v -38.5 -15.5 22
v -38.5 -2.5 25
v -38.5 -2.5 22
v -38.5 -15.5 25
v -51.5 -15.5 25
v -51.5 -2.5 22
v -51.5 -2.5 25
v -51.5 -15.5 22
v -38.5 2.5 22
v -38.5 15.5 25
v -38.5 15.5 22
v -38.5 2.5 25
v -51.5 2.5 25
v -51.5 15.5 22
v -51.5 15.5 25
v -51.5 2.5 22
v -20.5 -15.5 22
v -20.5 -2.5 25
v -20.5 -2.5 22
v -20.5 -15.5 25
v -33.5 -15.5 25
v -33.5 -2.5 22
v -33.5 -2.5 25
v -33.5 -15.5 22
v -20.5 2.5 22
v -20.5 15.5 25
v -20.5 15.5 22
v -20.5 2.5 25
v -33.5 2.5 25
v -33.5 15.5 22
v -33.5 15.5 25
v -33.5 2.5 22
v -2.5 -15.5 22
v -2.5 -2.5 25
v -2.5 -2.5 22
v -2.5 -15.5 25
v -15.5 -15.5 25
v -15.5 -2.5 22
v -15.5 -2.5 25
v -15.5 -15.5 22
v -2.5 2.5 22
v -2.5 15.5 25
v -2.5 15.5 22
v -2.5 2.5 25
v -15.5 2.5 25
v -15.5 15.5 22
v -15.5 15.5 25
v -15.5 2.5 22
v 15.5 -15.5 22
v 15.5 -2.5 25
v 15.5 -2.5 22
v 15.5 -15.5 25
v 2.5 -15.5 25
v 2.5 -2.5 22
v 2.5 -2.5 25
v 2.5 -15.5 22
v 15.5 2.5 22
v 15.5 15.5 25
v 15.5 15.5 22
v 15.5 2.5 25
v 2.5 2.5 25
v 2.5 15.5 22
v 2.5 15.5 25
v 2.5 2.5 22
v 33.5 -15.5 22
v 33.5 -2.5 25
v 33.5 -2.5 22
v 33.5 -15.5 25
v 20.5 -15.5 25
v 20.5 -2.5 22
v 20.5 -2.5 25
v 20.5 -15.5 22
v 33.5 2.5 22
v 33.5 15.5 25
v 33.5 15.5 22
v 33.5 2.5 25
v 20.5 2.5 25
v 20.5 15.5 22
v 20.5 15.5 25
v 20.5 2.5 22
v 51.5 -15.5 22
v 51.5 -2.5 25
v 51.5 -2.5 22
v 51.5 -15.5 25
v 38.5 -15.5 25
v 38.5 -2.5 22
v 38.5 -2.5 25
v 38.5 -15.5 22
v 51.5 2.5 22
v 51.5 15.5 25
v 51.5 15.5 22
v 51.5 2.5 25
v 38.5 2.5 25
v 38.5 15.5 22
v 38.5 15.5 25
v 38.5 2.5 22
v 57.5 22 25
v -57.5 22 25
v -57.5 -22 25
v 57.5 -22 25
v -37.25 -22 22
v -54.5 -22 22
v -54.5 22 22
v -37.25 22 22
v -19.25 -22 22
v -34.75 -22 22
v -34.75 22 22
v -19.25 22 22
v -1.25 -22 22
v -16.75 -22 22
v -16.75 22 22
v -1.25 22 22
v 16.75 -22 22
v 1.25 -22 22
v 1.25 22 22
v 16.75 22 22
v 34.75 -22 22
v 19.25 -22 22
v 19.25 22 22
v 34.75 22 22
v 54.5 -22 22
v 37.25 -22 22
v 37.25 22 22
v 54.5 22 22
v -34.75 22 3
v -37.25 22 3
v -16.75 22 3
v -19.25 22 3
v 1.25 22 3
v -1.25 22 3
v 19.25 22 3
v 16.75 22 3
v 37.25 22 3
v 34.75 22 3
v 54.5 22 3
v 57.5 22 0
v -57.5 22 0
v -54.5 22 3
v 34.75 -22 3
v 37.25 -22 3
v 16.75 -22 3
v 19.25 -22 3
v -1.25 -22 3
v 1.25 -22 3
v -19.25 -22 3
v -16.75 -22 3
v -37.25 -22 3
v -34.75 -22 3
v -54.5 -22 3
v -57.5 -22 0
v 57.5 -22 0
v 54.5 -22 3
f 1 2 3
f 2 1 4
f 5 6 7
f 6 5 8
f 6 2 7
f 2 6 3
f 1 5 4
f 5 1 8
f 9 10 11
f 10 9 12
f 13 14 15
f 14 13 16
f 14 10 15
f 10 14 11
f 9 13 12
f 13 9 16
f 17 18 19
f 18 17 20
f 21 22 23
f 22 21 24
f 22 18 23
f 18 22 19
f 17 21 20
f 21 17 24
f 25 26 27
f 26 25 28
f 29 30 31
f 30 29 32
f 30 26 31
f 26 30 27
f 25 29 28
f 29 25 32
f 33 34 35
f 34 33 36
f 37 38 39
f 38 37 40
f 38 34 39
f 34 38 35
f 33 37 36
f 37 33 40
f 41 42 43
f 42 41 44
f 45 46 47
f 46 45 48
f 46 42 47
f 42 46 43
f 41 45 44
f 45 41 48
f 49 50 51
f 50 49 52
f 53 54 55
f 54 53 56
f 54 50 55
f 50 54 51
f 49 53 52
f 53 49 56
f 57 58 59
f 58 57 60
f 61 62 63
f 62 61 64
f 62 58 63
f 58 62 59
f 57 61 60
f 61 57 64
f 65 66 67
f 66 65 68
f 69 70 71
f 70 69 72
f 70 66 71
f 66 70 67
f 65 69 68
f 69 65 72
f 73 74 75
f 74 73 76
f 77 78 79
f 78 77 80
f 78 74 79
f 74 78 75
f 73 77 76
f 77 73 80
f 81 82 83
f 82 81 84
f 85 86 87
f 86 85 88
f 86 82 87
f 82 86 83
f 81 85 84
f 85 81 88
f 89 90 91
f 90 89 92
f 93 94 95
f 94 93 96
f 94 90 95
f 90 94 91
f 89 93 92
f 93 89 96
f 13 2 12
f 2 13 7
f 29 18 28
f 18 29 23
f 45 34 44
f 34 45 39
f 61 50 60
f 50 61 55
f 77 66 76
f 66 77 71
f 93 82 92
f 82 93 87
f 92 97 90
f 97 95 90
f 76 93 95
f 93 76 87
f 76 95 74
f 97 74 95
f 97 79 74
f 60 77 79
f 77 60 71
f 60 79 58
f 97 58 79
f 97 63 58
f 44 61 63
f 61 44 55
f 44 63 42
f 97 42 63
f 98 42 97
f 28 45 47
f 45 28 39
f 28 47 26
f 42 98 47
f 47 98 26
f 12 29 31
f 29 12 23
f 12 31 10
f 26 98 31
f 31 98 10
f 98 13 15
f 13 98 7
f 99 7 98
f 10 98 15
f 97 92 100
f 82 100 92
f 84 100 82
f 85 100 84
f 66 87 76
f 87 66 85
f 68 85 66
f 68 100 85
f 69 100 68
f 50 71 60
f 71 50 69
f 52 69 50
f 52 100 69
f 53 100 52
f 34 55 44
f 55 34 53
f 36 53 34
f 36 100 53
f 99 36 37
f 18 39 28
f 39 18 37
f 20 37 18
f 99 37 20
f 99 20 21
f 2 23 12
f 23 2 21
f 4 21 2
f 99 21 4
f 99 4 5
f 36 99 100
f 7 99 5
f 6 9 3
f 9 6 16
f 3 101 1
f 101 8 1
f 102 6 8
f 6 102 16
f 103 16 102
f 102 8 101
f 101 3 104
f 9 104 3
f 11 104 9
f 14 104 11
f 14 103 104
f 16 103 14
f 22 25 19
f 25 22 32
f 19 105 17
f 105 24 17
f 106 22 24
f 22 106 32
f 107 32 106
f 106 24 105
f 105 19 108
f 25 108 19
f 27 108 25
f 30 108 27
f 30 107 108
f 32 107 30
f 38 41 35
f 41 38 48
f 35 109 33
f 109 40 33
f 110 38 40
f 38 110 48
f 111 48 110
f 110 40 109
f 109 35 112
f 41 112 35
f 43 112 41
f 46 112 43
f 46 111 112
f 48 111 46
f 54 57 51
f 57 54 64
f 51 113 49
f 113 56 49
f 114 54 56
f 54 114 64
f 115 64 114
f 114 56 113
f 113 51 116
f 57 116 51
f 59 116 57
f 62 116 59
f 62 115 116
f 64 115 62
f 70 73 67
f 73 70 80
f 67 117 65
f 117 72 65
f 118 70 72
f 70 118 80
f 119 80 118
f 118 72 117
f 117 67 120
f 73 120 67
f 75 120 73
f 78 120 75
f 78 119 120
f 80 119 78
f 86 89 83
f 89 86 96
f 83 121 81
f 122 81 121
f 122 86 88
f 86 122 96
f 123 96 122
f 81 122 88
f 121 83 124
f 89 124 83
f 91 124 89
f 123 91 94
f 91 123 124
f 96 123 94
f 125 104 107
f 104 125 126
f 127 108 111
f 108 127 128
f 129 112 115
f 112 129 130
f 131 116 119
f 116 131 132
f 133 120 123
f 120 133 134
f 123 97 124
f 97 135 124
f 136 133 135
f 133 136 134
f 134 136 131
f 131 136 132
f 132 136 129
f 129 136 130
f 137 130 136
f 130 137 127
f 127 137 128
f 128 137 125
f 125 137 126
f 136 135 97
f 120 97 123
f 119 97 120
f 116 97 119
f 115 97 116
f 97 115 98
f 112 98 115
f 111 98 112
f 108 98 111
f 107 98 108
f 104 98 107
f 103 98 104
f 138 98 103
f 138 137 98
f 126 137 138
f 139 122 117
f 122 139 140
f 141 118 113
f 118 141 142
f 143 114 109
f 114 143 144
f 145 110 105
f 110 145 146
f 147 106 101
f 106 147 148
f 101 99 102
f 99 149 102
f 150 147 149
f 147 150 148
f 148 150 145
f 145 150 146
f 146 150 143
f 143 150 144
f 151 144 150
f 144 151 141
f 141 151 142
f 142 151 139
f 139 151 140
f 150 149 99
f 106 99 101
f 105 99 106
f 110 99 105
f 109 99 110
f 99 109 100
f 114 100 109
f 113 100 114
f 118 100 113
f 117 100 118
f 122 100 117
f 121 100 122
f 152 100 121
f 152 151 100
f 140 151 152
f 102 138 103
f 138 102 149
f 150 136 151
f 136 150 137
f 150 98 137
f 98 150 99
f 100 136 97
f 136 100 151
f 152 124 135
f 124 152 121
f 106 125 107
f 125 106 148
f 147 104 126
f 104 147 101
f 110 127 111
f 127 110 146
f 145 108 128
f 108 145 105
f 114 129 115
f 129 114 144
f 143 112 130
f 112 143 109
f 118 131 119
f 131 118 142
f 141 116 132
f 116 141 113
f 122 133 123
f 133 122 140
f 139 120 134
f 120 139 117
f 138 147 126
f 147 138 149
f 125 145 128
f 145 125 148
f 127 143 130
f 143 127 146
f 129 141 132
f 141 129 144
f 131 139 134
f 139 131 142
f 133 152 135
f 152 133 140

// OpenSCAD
// 12-cuvette rack, printed standing on its base (z = 0 to 25)
// All dimensions in mm, taken from the user's caliper measurements.

$fn = 64;

// Base & deck plates
base_x = 112;   // X length of base plate
base_y = 44;    // Y depth of base plate
base_t = 3;     // base plate thickness (z 0..3)
deck_t = 3;     // deck plate thickness (z 22..25)
deck_z = 22;    // bottom of deck plate

// Upright walls (z 0..25, full Y depth)
wall_h = 25;    // total wall height
end_w  = 3;     // end-wall thickness (X)
rib_w  = 2.5;   // rib thickness (X)
rib_x  = [-36, -18, 0, 18, 36]; // rib centre X positions

// Deck through-holes
hole_s = 13;    // square hole side (13 x 13)
pitch  = 18;    // centre-to-centre spacing in both X and Y
rows_y = 2;     // rows along Y
cols_x = 6;     // columns along X

// ---- Base plate (z 0..3) ----
module base() {
    translate([-base_x / 2, -base_y / 2, 0])
        cube([base_x, base_y, base_t]);
}

// ---- Deck plate (z 22..25) with 12 square through-holes ----
module deck() {
    difference() {
        translate([-base_x / 2, -base_y / 2, deck_z])
            cube([base_x, base_y, deck_t]);
        for (i = [0 : cols_x - 1]) {
            for (j = [0 : rows_y - 1]) {
                hx = (i - (cols_x - 1) / 2) * pitch;
                hy = (j - (rows_y - 1) / 2) * pitch;
                translate([hx - hole_s / 2, hy - hole_s / 2, deck_z - 1])
                    cube([hole_s, hole_s, deck_t + 2]);
            }
        }
    }
}

// ---- Upright walls (z 0..25, full Y depth) ----
module walls() {
    union() {
        // Two 3 mm end walls flush with the short ends (x = ±56)
        for (ex = [-base_x / 2, base_x / 2]) {
            translate([ex - end_w / 2, -base_y / 2, 0])
                cube([end_w, base_y, wall_h]);
        }
        // Five 2.5 mm ribs at the given X centres
        for (rx = rib_x) {
            translate([rx - rib_w / 2, -base_y / 2, 0])
                cube([rib_w, base_y, wall_h]);
        }
    }
}

// ---- Assemble the rack ----
union() {
    base();
    deck();
    walls();
}
